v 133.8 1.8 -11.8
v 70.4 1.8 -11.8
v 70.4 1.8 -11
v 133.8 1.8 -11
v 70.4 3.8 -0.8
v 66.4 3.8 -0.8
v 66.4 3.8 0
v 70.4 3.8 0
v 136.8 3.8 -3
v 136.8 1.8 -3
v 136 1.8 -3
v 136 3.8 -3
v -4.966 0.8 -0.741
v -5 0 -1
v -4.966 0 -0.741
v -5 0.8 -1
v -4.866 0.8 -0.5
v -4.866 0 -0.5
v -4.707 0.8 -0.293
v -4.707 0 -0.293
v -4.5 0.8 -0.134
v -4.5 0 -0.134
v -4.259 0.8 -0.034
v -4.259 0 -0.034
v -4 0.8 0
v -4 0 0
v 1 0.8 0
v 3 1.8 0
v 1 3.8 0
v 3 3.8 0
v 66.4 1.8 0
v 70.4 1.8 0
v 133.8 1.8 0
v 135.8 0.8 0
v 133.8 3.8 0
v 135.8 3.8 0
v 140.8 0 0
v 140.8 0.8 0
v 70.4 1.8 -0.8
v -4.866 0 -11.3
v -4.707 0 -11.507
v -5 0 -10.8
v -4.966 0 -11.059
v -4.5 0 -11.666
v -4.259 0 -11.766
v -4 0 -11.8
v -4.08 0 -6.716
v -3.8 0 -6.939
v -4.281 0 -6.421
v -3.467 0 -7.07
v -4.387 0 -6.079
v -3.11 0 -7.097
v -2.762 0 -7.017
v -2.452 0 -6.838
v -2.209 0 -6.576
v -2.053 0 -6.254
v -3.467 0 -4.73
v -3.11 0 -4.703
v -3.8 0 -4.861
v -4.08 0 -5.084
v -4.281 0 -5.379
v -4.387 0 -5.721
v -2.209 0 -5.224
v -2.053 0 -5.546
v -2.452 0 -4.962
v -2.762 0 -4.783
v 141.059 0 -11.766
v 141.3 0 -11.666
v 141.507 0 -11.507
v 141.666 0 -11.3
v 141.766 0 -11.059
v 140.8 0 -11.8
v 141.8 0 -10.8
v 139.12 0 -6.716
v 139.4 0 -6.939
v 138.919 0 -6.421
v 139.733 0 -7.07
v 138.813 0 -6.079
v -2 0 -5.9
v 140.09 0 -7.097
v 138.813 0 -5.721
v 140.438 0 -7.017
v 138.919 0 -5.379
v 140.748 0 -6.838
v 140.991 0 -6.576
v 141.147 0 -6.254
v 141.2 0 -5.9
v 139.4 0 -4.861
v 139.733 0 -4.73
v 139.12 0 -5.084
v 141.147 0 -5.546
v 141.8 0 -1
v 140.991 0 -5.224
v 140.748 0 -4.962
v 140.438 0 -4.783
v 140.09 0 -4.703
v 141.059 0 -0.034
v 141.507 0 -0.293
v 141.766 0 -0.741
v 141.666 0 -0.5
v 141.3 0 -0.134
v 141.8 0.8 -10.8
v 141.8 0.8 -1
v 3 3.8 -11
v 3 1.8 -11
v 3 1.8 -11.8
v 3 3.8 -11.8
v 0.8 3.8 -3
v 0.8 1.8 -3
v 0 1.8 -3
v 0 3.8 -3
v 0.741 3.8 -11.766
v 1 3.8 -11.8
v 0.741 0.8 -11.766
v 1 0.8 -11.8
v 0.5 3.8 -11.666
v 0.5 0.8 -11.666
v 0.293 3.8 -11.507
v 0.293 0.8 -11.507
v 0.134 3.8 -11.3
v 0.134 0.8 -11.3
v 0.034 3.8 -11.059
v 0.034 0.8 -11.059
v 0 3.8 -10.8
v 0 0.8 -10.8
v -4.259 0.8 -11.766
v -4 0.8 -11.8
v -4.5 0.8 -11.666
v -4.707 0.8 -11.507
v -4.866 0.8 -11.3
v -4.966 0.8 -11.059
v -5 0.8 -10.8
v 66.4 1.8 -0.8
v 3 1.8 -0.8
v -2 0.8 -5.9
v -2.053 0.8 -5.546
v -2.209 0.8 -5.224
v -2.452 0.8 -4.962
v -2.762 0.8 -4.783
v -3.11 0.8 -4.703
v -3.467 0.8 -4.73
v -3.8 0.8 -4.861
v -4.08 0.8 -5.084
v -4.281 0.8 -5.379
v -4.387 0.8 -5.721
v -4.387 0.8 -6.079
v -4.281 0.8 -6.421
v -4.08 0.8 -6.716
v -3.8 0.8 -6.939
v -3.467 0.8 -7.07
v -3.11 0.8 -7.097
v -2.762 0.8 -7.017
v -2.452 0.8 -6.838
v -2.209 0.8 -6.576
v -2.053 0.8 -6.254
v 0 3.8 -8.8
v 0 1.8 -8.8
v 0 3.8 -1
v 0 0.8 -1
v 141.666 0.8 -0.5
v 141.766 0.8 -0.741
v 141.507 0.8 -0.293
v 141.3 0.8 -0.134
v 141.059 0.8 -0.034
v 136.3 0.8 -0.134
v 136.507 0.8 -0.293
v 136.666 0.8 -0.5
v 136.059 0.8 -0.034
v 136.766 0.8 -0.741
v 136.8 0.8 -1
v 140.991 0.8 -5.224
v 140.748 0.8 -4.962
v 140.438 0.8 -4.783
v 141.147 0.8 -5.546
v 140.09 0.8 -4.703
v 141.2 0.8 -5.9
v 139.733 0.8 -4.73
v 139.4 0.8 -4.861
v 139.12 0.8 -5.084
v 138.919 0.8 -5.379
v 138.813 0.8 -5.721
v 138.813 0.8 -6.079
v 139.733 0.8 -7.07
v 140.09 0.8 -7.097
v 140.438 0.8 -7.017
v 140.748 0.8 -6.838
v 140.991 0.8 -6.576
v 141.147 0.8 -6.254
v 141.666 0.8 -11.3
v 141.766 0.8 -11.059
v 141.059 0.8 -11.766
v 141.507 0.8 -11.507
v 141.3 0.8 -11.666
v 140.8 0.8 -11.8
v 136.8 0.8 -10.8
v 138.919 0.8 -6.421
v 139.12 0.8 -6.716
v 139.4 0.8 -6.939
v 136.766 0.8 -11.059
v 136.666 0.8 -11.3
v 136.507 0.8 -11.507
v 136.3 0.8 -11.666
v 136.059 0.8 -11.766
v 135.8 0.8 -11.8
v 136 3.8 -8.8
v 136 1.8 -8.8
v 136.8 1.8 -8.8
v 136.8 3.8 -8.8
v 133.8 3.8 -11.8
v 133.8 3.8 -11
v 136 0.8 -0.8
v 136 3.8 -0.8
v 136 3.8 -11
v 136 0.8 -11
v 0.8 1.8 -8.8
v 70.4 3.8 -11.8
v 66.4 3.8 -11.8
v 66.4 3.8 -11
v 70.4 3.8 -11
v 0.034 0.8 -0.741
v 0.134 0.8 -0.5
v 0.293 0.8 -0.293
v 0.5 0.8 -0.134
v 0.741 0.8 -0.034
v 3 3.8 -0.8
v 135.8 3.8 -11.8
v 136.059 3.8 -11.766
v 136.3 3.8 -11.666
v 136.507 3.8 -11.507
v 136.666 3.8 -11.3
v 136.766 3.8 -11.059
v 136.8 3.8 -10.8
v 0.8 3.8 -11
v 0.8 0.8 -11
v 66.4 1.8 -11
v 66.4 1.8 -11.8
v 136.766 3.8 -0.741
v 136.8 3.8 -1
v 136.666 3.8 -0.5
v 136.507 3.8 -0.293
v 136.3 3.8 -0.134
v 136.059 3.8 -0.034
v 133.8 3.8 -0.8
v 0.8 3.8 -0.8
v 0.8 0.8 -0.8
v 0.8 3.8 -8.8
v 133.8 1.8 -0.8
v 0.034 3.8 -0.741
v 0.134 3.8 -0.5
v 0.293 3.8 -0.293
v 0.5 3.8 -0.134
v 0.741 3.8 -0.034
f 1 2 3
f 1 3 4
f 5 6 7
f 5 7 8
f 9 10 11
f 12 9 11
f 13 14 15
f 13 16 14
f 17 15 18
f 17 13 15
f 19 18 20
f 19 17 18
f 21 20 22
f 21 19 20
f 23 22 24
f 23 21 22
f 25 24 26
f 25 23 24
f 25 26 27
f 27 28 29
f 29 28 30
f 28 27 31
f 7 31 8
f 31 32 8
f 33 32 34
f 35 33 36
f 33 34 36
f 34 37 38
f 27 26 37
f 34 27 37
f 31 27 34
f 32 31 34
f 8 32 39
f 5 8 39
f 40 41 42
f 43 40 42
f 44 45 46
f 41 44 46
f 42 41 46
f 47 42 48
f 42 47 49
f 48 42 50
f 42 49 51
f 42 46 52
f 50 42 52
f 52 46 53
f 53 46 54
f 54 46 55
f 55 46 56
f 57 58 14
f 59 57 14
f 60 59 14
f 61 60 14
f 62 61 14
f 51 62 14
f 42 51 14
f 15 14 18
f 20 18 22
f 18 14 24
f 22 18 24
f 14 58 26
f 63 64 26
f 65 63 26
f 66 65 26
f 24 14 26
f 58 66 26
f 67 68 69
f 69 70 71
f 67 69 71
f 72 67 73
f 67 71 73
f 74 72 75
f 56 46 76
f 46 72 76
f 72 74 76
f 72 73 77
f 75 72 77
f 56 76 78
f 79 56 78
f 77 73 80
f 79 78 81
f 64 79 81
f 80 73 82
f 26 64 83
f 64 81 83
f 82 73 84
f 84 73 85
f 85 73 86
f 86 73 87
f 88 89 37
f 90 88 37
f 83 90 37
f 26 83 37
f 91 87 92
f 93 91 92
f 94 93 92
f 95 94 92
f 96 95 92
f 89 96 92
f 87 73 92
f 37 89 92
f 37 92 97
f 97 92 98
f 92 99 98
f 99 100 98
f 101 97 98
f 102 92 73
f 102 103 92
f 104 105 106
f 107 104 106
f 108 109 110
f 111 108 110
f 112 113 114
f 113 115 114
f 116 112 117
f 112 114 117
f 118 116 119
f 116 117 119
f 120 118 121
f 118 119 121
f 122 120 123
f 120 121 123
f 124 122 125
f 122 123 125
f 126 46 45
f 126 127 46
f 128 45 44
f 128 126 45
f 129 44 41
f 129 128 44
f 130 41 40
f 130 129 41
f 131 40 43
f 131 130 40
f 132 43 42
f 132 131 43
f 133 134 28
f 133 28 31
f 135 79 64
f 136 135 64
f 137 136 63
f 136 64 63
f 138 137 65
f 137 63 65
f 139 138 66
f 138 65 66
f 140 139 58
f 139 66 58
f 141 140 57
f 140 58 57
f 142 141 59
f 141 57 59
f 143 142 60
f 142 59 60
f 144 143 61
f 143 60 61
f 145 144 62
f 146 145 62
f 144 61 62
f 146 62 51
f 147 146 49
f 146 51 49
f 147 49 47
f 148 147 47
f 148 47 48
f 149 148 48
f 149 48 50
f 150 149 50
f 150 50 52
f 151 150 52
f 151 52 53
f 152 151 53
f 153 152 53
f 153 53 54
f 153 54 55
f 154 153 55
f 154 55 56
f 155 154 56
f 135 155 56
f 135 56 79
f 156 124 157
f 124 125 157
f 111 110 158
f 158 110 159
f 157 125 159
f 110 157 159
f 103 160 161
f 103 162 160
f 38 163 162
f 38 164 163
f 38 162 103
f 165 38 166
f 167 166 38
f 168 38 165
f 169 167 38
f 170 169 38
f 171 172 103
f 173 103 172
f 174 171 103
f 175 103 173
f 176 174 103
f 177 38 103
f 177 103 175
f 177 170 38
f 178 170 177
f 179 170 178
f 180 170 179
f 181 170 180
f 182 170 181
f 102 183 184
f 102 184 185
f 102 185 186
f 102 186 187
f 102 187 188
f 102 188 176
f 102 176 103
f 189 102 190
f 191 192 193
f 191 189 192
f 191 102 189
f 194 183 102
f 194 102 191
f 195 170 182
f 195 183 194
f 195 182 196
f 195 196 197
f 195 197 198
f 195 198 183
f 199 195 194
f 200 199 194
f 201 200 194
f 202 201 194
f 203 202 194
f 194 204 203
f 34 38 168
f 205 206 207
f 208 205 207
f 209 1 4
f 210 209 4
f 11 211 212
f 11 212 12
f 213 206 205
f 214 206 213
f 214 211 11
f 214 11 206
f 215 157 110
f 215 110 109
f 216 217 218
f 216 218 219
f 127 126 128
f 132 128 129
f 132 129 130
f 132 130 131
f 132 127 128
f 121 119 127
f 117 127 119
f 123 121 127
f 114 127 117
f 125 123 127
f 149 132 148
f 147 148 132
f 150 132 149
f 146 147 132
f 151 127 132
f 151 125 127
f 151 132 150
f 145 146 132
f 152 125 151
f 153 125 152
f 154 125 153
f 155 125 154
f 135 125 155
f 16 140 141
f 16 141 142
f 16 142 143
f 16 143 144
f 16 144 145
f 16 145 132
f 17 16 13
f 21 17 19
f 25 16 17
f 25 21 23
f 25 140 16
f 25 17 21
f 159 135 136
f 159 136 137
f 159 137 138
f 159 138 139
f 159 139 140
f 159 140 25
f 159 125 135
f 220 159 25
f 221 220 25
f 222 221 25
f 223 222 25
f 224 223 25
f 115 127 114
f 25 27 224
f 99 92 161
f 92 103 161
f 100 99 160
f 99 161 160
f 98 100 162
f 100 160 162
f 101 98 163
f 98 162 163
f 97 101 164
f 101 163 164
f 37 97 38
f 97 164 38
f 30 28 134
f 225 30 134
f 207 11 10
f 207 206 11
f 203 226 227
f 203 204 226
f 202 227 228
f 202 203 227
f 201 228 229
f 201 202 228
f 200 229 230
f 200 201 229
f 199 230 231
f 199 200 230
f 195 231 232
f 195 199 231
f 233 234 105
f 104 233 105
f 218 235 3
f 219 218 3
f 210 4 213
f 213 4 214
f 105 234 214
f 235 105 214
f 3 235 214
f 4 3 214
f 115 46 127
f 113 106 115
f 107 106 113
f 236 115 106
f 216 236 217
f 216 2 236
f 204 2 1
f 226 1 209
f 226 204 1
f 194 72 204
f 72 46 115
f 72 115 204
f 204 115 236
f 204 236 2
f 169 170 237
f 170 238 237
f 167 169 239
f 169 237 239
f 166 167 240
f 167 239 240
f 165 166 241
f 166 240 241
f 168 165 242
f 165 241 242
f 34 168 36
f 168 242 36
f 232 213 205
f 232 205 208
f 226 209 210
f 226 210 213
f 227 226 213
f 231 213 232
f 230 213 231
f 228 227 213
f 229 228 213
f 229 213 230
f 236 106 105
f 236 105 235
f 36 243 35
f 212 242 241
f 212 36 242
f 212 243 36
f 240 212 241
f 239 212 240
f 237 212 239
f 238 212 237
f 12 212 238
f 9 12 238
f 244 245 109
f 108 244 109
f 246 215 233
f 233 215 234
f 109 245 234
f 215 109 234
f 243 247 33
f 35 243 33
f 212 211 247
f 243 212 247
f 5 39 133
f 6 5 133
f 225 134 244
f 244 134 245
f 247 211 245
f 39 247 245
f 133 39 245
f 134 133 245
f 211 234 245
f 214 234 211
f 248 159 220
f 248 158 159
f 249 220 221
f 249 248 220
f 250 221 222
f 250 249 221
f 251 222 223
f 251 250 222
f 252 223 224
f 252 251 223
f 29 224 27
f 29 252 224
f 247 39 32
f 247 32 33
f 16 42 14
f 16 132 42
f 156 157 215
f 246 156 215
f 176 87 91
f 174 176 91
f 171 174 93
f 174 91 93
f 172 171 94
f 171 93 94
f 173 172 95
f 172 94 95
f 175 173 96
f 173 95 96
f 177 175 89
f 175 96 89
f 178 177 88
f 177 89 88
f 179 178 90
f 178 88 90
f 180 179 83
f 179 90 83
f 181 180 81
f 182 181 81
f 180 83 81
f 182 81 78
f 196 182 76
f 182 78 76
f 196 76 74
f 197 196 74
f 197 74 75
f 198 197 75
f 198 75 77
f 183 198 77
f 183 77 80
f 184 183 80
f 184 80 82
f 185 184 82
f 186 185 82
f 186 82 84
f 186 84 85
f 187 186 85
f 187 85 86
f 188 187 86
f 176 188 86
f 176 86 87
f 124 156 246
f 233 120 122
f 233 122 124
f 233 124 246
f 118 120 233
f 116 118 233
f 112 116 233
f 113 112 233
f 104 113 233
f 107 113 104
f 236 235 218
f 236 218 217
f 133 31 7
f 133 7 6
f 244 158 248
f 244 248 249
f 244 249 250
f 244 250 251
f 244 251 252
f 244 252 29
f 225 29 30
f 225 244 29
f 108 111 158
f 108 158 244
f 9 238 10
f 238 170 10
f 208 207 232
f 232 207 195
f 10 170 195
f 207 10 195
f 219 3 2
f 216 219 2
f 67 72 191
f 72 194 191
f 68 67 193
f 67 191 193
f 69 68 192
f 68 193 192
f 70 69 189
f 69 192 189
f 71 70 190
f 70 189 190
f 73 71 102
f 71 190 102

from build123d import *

# Parameters (mm, degrees)
ESQUISSE1_W             = 136.8
ESQUISSE1_H             = 11.8
BOSS_EXTRU_1_DEPTH      = 0.8
ESQUISSE2_W             = 136.8
ESQUISSE2_H             = 11.8
ESQUISSE2_W_2           = 135.2
ESQUISSE2_H_2           = 10.2
BOSS_EXTRU_2_DEPTH      = 1
ESQUISSE3_W             = 4
ESQUISSE3_H             = 0.8
BOSS_EXTRU_3_DEPTH      = 2
ESQUISSE4_W             = 11.8
ESQUISSE4_H             = 0.8
BOSS_EXTRU_4_DEPTH      = 5
ESQUISSE5_W             = 11.8
ESQUISSE5_H             = 0.8
BOSS_EXTRU_5_DEPTH      = 5
ESQUISSE6_R             = 1.2
ENL_V_MAT_EXTRU_1_DEPTH = 4
CONG_1_R                = 1


with BuildPart() as part:
    # Esquisse1 → Boss.-Extru.1 (new body)
    with BuildSketch(Plane(origin=(0, 0, 0), x_dir=(1, 0, 0), z_dir=(0, 1, 0))):
        with Locations((68.4, 5.9)):
            Rectangle(ESQUISSE1_W, ESQUISSE1_H)
    extrude(amount=BOSS_EXTRU_1_DEPTH)

    # Esquisse2 → Boss.-Extru.2 (add)
    with BuildSketch(Plane(origin=(0, 0.8, 0), x_dir=(1, 0, 0), z_dir=(0, 1, 0))):
        with Locations((68.4, 5.9)):
            Rectangle(ESQUISSE2_W, ESQUISSE2_H)
        with Locations((68.4, 5.9)):
            Rectangle(ESQUISSE2_W_2, ESQUISSE2_H_2, mode=Mode.SUBTRACT)
    extrude(amount=BOSS_EXTRU_2_DEPTH)

    # Esquisse3 → Boss.-Extru.3 (add)
    with BuildSketch(Plane(origin=(0, 1.8, 0), x_dir=(1, 0, 0), z_dir=(0, 1, 0))):
        Polygon((0.8, 3), (0, 3), (0, 0), (3, 0), (3, 0.8), (0.8, 0.8), align=None)
        Polygon((3, 11.8), (0, 11.8), (0, 8.8), (0.8, 8.8), (0.8, 11), (3, 11), align=None)
        Polygon((133.8, 11), (136, 11), (136, 8.8), (136.8, 8.8), (136.8, 11.8), (133.8, 11.8), align=None)
        with Locations((68.4, 11.4)):
            Rectangle(ESQUISSE3_W, ESQUISSE3_H)
        with Locations((68.4, 0.4)):
            Rectangle(ESQUISSE3_W, ESQUISSE3_H)
        Polygon((133.8, 0), (136.8, 0), (136.8, 3), (136, 3), (136, 0.8), (133.8, 0.8), align=None)
    extrude(amount=BOSS_EXTRU_3_DEPTH)

    # Esquisse4 → Boss.-Extru.4 (add)
    with BuildSketch(Plane(origin=(136.8, 0, 0), x_dir=(0, 0, -1), z_dir=(1, 0, 0))):
        with Locations((5.9, 0.4)):
            Rectangle(ESQUISSE4_W, ESQUISSE4_H)
    extrude(amount=BOSS_EXTRU_4_DEPTH)

    # Esquisse5 → Boss.-Extru.5 (add)
    with BuildSketch(Plane.ZY):
        with Locations((-5.9, 0.4)):
            Rectangle(ESQUISSE5_W, ESQUISSE5_H)
    extrude(amount=BOSS_EXTRU_5_DEPTH)

    # Esquisse6 → Enlèv. mat.-Extru.1 (cut)
    with BuildSketch(Plane.XZ):
        with Locations((140, -5.9)):
            Circle(ESQUISSE6_R)
        with Locations((-3.2, -5.9)):
            Circle(ESQUISSE6_R)
    extrude(amount=-ENL_V_MAT_EXTRU_1_DEPTH, mode=Mode.SUBTRACT)

    # Congé1
    cong_1_edges = [part.edges().sort_by_distance(p)[0] for p in [
        (141.8, 0.4, -11.8),
        (141.8, 0.4, 0),
        (-5, 0.4, -11.8),
        (-5, 0.4, 0),
        (0, 2.3, -11.8),
        (136.8, 2.3, -11.8),
        (136.8, 2.3, 0),
        (0, 2.3, 0),
    ]]
    fillet(cong_1_edges, radius=CONG_1_R)


solid = part.part
